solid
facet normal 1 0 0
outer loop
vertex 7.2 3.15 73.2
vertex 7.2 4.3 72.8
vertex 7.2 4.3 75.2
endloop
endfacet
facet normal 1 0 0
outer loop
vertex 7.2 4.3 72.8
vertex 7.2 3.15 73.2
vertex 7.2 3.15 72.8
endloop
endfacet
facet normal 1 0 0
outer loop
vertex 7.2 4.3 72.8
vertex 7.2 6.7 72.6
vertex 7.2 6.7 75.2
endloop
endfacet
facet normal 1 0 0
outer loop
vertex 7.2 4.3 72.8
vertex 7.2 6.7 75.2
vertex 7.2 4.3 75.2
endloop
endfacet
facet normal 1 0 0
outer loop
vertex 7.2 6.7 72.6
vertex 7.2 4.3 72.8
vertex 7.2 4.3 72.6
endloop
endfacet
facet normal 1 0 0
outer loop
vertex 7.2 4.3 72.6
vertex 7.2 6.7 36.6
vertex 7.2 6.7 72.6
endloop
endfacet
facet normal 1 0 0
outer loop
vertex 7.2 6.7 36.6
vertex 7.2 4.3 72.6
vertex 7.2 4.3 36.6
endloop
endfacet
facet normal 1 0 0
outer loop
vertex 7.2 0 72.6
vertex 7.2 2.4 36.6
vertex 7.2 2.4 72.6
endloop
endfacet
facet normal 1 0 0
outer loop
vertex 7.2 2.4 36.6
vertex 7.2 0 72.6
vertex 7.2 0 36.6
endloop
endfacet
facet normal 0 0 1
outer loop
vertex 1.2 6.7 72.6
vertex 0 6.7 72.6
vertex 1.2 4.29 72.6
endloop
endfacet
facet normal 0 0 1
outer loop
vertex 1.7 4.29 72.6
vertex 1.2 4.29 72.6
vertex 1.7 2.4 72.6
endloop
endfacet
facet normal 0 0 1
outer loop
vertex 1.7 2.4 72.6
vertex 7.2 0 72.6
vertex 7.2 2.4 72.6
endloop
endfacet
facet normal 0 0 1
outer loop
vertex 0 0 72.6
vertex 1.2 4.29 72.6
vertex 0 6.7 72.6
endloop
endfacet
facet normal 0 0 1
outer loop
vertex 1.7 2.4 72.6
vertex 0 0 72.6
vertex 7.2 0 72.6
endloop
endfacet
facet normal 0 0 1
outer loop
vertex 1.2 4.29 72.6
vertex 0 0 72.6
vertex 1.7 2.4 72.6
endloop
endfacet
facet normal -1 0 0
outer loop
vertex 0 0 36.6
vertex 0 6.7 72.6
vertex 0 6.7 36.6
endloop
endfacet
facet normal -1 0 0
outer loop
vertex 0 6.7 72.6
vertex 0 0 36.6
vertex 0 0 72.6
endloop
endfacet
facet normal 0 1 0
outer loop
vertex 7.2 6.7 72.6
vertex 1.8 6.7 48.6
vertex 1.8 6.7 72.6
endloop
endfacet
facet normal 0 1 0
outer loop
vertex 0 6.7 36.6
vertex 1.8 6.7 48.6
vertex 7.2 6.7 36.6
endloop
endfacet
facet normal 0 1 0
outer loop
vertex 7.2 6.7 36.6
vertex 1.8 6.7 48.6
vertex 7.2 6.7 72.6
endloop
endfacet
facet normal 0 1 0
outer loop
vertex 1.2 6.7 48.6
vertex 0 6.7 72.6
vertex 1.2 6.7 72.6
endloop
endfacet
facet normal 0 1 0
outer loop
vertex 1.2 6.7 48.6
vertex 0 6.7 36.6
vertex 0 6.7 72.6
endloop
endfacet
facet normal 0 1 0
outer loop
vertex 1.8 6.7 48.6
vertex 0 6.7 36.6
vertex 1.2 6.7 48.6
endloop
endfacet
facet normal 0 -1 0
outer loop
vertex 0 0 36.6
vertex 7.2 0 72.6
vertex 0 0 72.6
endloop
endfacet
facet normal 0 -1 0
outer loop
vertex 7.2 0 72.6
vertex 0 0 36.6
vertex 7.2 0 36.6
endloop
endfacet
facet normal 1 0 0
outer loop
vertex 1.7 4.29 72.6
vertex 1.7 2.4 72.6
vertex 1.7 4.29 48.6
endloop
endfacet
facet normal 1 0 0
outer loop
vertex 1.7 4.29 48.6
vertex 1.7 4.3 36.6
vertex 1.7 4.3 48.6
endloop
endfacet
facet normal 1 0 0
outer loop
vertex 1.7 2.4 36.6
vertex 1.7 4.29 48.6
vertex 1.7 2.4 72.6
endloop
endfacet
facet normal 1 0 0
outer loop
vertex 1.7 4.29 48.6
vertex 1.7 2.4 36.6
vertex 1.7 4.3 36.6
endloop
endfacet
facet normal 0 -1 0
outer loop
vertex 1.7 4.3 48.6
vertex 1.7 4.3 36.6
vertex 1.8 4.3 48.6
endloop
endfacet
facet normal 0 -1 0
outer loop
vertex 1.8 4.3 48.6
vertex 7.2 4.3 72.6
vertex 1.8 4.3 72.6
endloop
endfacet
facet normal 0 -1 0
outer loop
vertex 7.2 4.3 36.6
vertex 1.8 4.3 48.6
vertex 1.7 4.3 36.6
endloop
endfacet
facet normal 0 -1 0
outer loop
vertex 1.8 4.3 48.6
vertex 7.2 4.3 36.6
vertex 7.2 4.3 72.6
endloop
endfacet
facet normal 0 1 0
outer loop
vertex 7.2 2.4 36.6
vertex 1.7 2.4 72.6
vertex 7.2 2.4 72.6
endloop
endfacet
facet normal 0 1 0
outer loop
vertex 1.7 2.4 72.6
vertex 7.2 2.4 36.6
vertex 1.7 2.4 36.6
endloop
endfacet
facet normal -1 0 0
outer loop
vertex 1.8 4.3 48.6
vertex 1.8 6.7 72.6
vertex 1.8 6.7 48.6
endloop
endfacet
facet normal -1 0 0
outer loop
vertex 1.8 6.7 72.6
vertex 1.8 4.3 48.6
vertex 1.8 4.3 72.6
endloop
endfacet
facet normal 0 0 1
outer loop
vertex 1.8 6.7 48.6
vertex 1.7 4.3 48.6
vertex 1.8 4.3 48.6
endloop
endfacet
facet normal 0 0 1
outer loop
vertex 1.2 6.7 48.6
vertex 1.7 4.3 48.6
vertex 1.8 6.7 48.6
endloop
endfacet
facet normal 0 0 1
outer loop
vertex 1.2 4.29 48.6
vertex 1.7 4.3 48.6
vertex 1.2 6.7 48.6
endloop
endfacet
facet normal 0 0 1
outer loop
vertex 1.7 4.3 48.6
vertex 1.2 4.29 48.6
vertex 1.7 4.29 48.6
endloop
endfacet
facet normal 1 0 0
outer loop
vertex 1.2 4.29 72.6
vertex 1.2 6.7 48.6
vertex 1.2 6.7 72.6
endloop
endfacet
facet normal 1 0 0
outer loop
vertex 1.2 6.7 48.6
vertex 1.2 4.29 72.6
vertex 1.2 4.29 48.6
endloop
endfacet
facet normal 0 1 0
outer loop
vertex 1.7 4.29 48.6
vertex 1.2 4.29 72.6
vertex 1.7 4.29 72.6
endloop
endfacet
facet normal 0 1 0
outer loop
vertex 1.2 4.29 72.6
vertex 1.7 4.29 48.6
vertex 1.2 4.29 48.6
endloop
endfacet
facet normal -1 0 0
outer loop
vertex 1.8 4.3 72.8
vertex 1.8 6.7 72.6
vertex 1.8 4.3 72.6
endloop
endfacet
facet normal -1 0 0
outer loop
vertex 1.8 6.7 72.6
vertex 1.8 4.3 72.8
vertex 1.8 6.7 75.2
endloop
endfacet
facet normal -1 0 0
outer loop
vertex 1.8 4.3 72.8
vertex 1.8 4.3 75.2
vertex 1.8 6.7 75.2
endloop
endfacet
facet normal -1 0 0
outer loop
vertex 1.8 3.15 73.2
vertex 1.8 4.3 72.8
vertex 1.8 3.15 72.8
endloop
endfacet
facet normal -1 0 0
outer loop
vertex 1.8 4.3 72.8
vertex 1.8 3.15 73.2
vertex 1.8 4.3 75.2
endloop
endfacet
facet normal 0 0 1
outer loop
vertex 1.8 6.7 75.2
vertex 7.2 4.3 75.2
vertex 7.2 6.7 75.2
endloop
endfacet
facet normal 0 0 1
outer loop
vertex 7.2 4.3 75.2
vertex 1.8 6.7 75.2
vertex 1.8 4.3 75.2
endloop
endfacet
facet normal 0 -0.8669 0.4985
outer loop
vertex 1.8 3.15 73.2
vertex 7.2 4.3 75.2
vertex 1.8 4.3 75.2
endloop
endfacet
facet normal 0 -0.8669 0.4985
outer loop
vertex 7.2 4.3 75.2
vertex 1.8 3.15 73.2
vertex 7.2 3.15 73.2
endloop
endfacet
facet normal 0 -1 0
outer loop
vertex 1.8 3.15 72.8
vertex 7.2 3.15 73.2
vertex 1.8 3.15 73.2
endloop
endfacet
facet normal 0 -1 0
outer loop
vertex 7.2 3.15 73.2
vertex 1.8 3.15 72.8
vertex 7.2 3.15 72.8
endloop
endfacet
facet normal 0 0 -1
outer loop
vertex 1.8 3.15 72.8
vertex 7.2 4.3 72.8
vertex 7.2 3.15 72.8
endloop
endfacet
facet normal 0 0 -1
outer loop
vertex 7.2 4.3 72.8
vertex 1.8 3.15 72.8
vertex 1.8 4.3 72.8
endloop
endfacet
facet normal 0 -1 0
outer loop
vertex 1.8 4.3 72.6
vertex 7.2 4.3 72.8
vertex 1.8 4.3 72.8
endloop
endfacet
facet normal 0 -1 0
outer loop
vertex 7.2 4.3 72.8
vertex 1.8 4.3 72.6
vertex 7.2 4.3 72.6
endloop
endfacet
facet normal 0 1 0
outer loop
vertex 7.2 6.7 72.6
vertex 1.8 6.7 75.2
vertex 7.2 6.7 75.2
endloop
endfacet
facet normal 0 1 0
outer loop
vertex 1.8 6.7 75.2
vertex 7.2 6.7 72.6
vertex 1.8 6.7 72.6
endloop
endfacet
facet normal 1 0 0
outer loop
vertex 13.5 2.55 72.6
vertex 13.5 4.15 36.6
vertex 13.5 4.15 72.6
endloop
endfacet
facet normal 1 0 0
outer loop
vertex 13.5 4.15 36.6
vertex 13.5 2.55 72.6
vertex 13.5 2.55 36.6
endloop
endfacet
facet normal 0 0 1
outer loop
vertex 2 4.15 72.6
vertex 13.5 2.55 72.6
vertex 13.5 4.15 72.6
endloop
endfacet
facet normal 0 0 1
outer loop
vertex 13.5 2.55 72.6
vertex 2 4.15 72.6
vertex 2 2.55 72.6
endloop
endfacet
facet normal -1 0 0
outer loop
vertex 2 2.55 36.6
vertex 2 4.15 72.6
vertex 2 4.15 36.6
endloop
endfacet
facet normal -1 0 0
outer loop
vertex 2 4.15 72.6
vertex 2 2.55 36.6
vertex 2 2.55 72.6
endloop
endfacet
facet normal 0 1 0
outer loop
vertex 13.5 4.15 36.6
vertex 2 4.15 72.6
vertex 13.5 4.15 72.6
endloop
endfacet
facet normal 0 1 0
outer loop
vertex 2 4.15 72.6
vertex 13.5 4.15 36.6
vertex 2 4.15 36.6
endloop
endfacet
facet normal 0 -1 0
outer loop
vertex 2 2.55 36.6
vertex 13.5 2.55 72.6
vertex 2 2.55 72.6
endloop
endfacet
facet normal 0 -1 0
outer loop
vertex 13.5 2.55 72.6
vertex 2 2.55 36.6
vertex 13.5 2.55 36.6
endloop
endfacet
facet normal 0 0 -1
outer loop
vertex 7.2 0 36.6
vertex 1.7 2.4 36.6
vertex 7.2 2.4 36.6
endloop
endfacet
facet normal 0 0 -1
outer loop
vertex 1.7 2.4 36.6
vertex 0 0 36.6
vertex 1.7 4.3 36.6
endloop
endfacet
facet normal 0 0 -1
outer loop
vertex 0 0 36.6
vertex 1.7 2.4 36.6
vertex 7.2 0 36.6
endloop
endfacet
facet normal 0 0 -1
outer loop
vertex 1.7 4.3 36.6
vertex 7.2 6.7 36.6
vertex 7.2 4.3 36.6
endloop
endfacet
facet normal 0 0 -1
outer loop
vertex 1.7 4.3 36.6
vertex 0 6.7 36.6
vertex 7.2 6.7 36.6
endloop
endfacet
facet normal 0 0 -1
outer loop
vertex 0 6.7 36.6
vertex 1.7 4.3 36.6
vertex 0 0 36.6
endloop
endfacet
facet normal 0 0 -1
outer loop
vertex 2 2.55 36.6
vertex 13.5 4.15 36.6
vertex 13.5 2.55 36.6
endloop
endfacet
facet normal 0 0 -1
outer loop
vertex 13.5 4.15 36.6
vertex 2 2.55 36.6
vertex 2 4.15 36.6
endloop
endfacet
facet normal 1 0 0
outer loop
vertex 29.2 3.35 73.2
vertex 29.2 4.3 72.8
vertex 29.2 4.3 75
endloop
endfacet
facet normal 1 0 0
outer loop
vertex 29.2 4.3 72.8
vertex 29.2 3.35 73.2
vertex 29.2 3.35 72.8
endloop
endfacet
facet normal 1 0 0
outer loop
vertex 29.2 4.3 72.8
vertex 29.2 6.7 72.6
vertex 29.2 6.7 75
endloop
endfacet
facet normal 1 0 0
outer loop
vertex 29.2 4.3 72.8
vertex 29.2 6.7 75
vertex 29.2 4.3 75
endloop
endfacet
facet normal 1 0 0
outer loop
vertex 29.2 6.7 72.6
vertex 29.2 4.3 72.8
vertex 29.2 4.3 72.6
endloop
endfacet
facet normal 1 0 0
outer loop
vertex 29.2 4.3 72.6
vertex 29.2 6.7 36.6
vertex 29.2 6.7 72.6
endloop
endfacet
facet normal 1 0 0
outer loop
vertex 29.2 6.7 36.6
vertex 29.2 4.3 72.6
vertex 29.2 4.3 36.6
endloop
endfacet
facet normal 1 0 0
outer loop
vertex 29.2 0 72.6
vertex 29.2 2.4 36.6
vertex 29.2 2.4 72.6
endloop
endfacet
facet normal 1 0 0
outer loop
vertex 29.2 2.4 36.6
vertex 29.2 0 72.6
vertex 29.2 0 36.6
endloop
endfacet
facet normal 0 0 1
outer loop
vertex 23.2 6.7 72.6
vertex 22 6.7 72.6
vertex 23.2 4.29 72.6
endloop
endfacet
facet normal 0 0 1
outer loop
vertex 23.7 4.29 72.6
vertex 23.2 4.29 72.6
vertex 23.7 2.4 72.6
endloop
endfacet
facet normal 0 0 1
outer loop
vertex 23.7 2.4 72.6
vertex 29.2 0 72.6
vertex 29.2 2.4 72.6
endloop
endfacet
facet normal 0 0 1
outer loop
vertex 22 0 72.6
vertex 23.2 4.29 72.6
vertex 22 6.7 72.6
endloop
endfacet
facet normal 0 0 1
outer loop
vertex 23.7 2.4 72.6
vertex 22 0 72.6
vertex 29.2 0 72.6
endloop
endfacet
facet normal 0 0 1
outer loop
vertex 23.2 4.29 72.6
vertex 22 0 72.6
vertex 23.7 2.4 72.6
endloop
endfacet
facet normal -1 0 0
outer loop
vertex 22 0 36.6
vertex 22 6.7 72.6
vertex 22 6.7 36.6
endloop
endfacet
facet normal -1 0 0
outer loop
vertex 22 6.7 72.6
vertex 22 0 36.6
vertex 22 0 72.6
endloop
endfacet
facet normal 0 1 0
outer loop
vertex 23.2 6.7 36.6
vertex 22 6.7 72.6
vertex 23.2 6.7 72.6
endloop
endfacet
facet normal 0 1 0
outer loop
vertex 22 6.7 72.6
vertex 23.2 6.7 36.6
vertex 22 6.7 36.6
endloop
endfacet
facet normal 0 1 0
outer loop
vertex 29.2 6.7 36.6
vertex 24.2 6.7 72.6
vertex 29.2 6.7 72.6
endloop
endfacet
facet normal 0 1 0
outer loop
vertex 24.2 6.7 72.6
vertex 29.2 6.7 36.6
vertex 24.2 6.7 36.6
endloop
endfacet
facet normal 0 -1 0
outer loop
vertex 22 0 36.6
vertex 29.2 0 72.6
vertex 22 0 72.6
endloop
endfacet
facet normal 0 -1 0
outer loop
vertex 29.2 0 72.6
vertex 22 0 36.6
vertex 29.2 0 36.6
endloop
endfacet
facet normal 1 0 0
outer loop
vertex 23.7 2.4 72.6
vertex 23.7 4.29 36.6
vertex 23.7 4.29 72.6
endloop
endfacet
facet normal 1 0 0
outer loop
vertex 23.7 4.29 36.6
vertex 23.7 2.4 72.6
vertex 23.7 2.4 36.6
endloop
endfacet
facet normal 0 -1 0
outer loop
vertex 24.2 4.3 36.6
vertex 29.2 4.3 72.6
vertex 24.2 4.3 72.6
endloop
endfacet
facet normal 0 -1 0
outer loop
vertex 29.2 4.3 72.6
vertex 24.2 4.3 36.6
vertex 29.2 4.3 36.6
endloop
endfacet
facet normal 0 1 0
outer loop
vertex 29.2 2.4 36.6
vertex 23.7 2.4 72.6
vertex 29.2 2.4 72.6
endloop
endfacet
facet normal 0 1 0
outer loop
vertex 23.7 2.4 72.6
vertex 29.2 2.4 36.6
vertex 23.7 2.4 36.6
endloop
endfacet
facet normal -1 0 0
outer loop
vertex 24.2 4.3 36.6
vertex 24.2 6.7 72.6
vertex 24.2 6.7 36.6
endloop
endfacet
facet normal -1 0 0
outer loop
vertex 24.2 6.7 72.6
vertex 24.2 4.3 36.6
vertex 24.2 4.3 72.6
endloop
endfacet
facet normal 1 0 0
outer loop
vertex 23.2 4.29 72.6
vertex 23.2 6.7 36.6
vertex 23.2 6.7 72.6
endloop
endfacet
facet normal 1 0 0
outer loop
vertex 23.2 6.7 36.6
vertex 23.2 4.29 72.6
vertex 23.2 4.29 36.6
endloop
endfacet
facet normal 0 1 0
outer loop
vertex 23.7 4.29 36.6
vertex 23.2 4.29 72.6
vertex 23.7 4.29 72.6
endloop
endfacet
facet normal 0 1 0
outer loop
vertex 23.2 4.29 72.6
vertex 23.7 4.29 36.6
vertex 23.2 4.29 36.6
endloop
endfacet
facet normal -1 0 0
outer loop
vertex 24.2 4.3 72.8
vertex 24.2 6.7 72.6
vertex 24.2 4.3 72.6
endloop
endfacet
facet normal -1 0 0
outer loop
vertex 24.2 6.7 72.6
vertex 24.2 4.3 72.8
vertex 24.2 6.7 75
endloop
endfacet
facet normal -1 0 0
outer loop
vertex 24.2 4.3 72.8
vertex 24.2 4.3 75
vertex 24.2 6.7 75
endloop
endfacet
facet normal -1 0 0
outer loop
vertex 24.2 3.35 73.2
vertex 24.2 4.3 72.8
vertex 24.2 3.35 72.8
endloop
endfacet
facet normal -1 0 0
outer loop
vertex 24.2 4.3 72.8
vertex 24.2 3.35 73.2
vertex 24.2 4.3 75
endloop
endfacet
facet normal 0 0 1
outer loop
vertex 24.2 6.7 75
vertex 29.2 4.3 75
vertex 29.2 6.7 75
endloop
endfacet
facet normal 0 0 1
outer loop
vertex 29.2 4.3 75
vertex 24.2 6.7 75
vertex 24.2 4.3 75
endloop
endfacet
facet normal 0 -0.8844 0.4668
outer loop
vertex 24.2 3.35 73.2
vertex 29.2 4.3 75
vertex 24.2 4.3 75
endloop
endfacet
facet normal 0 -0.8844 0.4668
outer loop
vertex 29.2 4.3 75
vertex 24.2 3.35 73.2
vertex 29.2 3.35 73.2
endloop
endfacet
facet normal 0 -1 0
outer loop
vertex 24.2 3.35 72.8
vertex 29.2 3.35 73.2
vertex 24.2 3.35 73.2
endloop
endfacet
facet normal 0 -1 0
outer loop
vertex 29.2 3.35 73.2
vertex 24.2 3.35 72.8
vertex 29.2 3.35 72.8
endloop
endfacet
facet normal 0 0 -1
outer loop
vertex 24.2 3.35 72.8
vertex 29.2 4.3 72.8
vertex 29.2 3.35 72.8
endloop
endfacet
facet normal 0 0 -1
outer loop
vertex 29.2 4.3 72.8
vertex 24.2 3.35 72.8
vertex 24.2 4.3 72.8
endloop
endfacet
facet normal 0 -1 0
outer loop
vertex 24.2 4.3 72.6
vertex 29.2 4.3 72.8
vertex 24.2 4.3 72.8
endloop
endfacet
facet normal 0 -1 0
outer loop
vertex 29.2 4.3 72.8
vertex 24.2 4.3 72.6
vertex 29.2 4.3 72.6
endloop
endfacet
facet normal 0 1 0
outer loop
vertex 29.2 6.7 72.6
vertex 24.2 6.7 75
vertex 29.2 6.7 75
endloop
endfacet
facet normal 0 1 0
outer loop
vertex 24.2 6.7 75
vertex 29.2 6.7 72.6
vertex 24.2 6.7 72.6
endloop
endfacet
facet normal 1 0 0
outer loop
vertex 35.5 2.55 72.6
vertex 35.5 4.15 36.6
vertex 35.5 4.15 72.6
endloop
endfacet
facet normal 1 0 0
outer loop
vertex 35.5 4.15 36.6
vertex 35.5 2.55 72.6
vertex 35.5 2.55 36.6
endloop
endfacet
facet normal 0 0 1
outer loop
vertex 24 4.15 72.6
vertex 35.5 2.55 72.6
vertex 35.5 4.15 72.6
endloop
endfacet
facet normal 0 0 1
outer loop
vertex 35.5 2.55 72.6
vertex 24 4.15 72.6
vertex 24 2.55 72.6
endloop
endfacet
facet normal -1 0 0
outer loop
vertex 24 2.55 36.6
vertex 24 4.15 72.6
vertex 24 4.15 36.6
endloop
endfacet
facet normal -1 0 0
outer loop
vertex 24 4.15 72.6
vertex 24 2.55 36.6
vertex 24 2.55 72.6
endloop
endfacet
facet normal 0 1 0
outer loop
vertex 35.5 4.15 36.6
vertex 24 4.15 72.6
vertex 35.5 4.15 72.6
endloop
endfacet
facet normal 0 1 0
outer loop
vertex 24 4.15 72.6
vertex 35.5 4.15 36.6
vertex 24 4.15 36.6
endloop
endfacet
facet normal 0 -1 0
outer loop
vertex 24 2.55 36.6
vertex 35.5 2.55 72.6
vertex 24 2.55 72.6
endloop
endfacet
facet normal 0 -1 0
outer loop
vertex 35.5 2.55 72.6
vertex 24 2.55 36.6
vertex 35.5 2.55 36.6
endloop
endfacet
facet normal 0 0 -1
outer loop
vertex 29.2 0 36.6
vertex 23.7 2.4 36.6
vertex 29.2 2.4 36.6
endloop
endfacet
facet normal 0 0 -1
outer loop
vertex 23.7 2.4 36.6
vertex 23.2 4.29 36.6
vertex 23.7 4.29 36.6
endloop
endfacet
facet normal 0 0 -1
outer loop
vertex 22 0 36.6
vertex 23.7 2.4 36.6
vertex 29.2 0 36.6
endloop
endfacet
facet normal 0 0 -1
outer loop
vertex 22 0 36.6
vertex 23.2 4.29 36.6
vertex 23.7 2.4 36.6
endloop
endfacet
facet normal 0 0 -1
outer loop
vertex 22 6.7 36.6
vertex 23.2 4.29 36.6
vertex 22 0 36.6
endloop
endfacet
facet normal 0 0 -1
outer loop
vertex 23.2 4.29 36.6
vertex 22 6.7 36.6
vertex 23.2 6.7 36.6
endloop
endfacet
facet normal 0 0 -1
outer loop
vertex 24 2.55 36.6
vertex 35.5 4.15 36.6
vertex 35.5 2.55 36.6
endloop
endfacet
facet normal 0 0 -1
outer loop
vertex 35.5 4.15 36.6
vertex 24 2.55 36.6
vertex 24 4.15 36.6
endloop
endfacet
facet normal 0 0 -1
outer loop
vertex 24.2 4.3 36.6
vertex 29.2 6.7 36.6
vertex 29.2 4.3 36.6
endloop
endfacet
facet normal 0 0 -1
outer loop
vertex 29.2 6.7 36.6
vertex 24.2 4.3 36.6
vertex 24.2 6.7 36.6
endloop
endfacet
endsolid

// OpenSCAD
// Review proto (not a part): the DATA ×4 v2 cradle's left upright with its latch finger, today (24 mm
// free, 1.0 mm hook, a square root) and proposed (40 mm free, 0.8 mm hook, an R0.8 root, a 1.0 mm slit).
// The finger stands along the layers and bends across them, so it needs the lowest strain of all the
// rack's snaps: 0.72 % today at its root, 0.25 % proposed (docs/printed-parts-review.md › Cradle).
//
//   openscad -D 'VIEW="both"' -o cradle_finger.png mechanical/review/proto/cradle_finger.scad
VIEW = "both";
GAP = 0.15; UW = 2.4; OW = 1.2; END = 5.5; H = 72.6; T = 1.6;   // the board 1.6 thick
SLIT = 0.6;
module upright(latch = 24, hook = 1.0, slit = 0.6, fillet = 0) {
    x1 = 0.5 + OW + END;            // the upright's inner end
    difference() {
        cube([x1, UW + 2 * GAP + T + UW, H]);
        translate([OW + 0.5, UW, -1]) cube([END + 1, 2 * GAP + T, H + 2]);          // the slot the board's end sits in
        translate([OW, UW + 2 * GAP + T - 0.01, H - latch]) cube([slit, UW + 1, latch + 1]);   // the slit freeing the finger
        if (fillet) translate([OW + slit + fillet, UW + 2 * GAP + T - 0.01, H - latch]) rotate([-90, 0, 0])
            difference() { translate([-fillet, 0, 0]) cube([fillet, fillet, UW + 1]); translate([0, fillet, 0]) cylinder(r = fillet, h = UW + 1, $fn = 32); }
    }
    // the hook over the board's top edge, 45° lead-in on top
    yb = UW + 2 * GAP + T;
    translate([OW + slit, 0, H]) rotate([90, 0, 90]) linear_extrude(x1 - OW - slit)
        polygon([[yb + UW, 0], [yb, 0], [yb, 0.2], [yb - GAP - hook, 0.2], [yb - GAP - hook, 0.6], [yb, 1.6 + hook], [yb + UW, 1.6 + hook]]);
}
module board() color("#2f6f4f") translate([OW + 0.5 + 0.3, UW + GAP, 0]) cube([END + 6, T, H]);
// the top 36 mm only: the finger is what matters
module top(h = 36) intersection() { children(); translate([-1, -1, H - h]) cube([40, 20, h + 5]); }

if (VIEW == "today" || VIEW == "both") top() { color("#a9c4e4") upright(); board(); }
if (VIEW == "proposed" || VIEW == "both") translate([VIEW == "both" ? 22 : 0, 0, 0]) top() { color("#a9c4e4") upright(40, 0.8, 1.0, 0.8); board(); }
